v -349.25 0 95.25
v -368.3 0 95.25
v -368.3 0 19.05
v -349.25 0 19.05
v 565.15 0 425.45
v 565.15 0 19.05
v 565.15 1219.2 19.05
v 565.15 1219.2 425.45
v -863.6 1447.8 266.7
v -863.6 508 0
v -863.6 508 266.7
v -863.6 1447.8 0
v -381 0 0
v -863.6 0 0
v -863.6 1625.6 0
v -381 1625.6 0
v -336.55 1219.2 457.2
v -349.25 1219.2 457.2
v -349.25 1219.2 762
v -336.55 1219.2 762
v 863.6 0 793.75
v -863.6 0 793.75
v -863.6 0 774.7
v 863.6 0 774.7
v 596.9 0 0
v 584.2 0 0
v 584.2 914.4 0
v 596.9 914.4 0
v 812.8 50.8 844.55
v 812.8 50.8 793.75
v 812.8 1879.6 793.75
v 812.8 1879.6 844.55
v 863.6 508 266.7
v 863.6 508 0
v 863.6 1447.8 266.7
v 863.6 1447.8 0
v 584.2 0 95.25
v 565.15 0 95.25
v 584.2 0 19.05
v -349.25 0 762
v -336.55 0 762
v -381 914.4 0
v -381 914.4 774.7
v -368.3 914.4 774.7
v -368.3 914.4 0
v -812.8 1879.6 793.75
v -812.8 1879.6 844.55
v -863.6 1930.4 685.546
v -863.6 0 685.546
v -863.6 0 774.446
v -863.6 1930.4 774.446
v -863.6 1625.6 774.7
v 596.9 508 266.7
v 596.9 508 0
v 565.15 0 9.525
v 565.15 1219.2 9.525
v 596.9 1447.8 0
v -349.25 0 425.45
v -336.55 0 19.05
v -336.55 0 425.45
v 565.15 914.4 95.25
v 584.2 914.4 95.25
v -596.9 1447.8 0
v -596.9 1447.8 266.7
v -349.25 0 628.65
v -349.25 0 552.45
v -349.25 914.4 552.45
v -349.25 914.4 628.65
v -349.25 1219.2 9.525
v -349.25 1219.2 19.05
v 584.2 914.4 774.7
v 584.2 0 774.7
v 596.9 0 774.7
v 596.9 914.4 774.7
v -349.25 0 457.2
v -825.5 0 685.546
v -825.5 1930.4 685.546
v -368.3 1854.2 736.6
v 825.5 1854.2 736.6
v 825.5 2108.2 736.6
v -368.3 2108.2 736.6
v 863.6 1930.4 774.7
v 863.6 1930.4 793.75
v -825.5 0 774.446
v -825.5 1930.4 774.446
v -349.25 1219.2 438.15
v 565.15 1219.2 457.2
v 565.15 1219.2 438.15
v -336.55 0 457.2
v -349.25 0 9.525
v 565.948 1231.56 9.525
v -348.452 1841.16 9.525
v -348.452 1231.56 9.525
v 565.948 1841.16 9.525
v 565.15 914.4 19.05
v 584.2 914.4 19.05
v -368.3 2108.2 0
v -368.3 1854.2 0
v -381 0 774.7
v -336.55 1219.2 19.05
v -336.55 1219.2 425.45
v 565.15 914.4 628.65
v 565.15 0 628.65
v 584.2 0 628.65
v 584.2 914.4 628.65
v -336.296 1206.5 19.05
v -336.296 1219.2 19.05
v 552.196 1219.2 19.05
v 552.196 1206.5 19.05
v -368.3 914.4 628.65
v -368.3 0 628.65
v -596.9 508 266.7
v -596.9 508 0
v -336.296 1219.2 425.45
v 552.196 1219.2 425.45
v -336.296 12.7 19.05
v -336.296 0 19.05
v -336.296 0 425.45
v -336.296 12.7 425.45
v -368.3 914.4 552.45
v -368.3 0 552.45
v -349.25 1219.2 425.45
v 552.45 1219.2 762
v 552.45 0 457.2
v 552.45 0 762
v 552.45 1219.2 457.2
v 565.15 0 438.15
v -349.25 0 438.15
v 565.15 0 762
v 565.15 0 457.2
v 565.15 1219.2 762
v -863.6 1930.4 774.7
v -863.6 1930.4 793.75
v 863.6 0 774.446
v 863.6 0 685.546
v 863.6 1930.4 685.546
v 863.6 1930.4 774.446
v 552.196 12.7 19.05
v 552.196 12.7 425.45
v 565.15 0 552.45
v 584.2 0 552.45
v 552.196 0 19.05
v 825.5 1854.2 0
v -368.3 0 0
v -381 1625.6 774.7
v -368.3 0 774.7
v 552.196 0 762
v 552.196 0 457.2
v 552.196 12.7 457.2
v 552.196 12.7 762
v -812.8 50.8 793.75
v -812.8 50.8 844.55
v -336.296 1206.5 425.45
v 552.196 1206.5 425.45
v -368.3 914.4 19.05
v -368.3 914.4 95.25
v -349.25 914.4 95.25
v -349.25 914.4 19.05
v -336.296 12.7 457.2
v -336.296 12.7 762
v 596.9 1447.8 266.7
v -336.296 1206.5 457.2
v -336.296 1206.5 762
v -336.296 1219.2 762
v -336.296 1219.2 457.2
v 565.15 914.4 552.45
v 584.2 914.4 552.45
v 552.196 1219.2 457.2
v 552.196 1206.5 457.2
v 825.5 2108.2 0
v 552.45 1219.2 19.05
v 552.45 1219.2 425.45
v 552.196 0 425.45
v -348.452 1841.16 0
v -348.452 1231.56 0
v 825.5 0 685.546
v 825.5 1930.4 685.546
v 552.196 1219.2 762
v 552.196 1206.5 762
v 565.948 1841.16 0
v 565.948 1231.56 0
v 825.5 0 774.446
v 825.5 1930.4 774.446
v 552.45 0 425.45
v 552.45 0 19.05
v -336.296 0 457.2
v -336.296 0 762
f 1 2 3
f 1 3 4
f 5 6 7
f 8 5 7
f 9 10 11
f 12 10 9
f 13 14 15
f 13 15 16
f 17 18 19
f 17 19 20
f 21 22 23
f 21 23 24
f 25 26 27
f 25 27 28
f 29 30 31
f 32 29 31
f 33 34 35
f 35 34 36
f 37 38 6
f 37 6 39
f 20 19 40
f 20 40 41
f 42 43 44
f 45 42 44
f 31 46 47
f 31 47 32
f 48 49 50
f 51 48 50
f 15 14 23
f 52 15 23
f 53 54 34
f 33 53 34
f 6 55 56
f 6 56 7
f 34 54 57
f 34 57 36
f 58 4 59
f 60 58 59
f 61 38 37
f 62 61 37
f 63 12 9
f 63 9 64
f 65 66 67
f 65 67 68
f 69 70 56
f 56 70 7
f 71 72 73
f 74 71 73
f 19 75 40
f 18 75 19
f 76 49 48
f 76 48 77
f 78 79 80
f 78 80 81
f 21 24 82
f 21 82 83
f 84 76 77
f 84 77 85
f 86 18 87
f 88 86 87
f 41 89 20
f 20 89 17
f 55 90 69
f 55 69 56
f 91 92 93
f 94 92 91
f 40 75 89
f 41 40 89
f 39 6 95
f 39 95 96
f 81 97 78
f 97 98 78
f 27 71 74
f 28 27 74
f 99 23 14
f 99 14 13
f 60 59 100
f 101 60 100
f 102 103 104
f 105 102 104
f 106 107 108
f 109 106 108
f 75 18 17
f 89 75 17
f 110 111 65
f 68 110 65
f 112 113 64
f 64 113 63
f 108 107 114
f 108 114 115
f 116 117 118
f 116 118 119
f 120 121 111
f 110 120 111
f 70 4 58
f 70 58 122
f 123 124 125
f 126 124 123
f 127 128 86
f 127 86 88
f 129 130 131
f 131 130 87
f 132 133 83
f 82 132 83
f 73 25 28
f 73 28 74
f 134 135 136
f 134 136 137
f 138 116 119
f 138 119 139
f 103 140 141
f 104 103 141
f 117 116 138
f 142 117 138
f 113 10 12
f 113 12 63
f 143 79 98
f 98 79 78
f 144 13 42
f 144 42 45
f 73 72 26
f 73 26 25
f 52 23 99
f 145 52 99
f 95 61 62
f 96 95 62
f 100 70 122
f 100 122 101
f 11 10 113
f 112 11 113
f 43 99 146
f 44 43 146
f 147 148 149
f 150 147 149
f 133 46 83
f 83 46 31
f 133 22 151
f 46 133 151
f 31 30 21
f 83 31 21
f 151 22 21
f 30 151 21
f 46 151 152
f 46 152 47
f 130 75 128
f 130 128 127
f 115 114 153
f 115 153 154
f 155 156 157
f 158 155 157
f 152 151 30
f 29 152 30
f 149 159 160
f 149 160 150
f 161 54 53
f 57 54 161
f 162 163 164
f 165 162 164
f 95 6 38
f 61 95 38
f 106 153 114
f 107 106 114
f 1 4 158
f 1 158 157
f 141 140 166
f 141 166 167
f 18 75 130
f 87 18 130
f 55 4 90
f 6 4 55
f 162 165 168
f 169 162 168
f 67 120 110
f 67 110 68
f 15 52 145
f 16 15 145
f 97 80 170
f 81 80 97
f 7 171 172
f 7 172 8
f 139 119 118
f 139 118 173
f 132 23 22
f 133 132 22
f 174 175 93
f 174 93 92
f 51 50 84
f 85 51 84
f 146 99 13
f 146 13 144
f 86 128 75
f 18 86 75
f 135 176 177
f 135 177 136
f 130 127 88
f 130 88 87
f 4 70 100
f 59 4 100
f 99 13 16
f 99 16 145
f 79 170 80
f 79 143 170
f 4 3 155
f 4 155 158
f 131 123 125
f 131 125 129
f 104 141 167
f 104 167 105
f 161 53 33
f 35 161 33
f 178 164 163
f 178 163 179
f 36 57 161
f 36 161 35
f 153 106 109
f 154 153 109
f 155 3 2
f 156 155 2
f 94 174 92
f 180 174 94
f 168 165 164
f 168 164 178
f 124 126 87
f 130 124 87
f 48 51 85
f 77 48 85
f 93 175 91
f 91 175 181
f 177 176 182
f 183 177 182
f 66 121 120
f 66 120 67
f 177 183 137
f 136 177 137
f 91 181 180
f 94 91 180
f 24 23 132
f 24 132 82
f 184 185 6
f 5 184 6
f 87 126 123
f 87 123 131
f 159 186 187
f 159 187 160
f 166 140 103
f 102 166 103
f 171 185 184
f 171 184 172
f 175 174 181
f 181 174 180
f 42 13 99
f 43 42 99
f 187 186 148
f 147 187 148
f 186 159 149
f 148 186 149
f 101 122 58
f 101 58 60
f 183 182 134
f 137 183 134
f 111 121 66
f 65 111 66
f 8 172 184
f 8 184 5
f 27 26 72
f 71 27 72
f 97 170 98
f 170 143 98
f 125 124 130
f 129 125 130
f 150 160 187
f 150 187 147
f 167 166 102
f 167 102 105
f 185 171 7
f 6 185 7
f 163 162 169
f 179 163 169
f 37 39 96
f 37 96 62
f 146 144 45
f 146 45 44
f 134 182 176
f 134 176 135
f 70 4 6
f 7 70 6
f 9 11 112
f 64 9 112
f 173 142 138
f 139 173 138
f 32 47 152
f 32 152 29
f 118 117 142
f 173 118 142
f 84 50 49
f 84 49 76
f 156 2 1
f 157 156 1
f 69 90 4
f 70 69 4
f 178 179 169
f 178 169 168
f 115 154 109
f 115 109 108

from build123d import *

# Parameters (mm, degrees)
F0_W           = 1727.2
F0_H           = 19.05
F1_DEPTH       = 1930.4
F0_W_2         = 38.1
F0_H_2         = 88.9
F3_W           = 266.7
F3_H           = 939.8
F4_DEPTH       = 266.7
F5_W           = 12.7
F5_H           = 774.7
F6_DEPTH       = 914.4
F7_W           = 19.05
F7_H           = 76.2
F8_DEPTH       = 914.4
F9_W           = 914.4
F9_H           = 9.525
F10_DEPTH      = 1219.2
F11_W          = 12.7
F11_H          = 1219.2
F12_DEPTH      = 406.4
F11_W_2        = 888.492
F11_H_2        = 12.7
F13_W          = 1625.6
F13_H          = 1828.8
F14_DEPTH      = 50.8
F15_W          = 1193.8
F15_H          = 736.6
F16_DEPTH      = 76.2
F16_DEPTH_BACK = 177.8
F17_W          = 482.6
F17_H          = 774.7
F18_DEPTH      = 1625.6
F19_W          = 914.4
F19_H          = 609.6
F20_DEPTH      = 9.525
F21_W          = 914.4
F21_H          = 19.05
F22_DEPTH      = 1219.2
F23_W          = 12.7
F23_H          = 1219.2
F24_DEPTH      = 304.8
F23_W_2        = 888.492
F23_H_2        = 12.7


with BuildPart() as f1:
    # F0 (on Front) → F1 (new body)
    with BuildSketch(Plane.XZ):
        with Locations((0, 784.225)):
            Rectangle(F0_W, F0_H)
    extrude(amount=-F1_DEPTH)

    # F13 (on face) → F14 (join)
    with BuildSketch(Plane.XY.offset(793.75)):
        with Locations((0, 965.2)):
            Rectangle(F13_W, F13_H)
    extrude(amount=F14_DEPTH)


with BuildPart() as f1b:
    # F0 (on Front) → F1, piece 2 (new body)
    with BuildSketch(Plane.XZ):
        with Locations((844.55, 729.996)):
            Rectangle(F0_W_2, F0_H_2)
    extrude(amount=-F1_DEPTH)


with BuildPart() as f1c:
    # F0 (on Front) → F1, piece 3 (new body)
    with BuildSketch(Plane.XZ):
        with Locations((-844.55, 729.996)):
            Rectangle(F0_W_2, F0_H_2)
    extrude(amount=-F1_DEPTH)


with BuildPart() as f4:
    # F3 (on Top) → F4 (new body)
    with BuildSketch(Plane.XY):
        with Locations((730.25, 977.9)):
            Rectangle(F3_W, F3_H)
    extrude(amount=F4_DEPTH)


with BuildPart() as f4b:
    # F3 (on Top) → F4, piece 2 (new body)
    with BuildSketch(Plane.XY):
        with Locations((-730.25, 977.9)):
            Rectangle(F3_W, F3_H)
    extrude(amount=F4_DEPTH)


with BuildPart() as f6:
    # F5 (on Front) → F6 (new body)
    with BuildSketch(Plane.XZ):
        with Locations((-374.65, 387.35)):
            Rectangle(F5_W, F5_H)
    extrude(amount=-F6_DEPTH)


with BuildPart() as f6b:
    # F5 (on Front) → F6, piece 2 (new body)
    with BuildSketch(Plane.XZ):
        with Locations((590.55, 387.35)):
            Rectangle(F5_W, F5_H)
    extrude(amount=-F6_DEPTH)


with BuildPart() as f8:
    # F7 (on Front) → F8 (new body)
    with BuildSketch(Plane.XZ):
        with Locations((-358.775, 57.15)):
            Rectangle(F7_W, F7_H)
    extrude(amount=-F8_DEPTH)


with BuildPart() as f8b:
    # F7 (on Front) → F8, piece 2 (new body)
    with BuildSketch(Plane.XZ):
        with Locations((574.675, 57.15)):
            Rectangle(F7_W, F7_H)
    extrude(amount=-F8_DEPTH)


with BuildPart() as f8c:
    # F7 (on Front) → F8, piece 3 (new body)
    with BuildSketch(Plane.XZ):
        with Locations((-358.775, 590.55)):
            Rectangle(F7_W, F7_H)
    extrude(amount=-F8_DEPTH)


with BuildPart() as f8d:
    # F7 (on Front) → F8, piece 4 (new body)
    with BuildSketch(Plane.XZ):
        with Locations((574.675, 590.55)):
            Rectangle(F7_W, F7_H)
    extrude(amount=-F8_DEPTH)


with BuildPart() as f10:
    # F9 (on Front) → F10 (new body)
    with BuildSketch(Plane.XZ):
        with Locations((107.95, 14.2875)):
            Rectangle(F9_W, F9_H)
    extrude(amount=-F10_DEPTH)


with BuildPart() as f12:
    # F11 (on face) → F12 (new body)
    with BuildSketch(Plane.XY.offset(19.05)):
        with Locations((-342.9, 609.6)):
            Rectangle(F11_W, F11_H)
    extrude(amount=F12_DEPTH)


with BuildPart() as f12b:
    # F11 (on face) → F12, piece 2 (new body)
    with BuildSketch(Plane.XY.offset(19.05)):
        with Locations((558.8, 609.6)):
            Rectangle(F11_W, F11_H)
    extrude(amount=F12_DEPTH)


with BuildPart() as f12c:
    # F11 (on face) → F12, piece 3 (new body)
    with BuildSketch(Plane.XY.offset(19.05)):
        with Locations((107.95, 1212.85)):
            Rectangle(F11_W_2, F11_H_2)
    extrude(amount=F12_DEPTH)


with BuildPart() as f12d:
    # F11 (on face) → F12, piece 4 (new body)
    with BuildSketch(Plane.XY.offset(19.05)):
        with Locations((107.95, 6.35)):
            Rectangle(F11_W_2, F11_H_2)
    extrude(amount=F12_DEPTH)


with BuildPart() as f16:
    # F15 (on face) → F16 (new body, two sides)
    with BuildSketch(Plane(origin=(0, 1930.4, 0), x_dir=(-1, 0, 0), z_dir=(0, 1, 0))) as f16_sk:
        with Locations((-228.6, 368.3)):
            Rectangle(F15_W, F15_H)
    extrude(amount=-F16_DEPTH)
    extrude(f16_sk.sketch, amount=F16_DEPTH_BACK)


with BuildPart() as f18:
    # F17 (on face) → F18 (new body)
    with BuildSketch(Plane.XZ):
        with Locations((-622.3, 387.35)):
            Rectangle(F17_W, F17_H)
    extrude(amount=-F18_DEPTH)


with BuildPart() as f20:
    # F19 (on Top) → F20 (new body)
    with BuildSketch(Plane.XY):
        with Locations((108.7481622696, 1536.3599918365)):
            Rectangle(F19_W, F19_H)
    extrude(amount=F20_DEPTH)


with BuildPart() as f22:
    # F21 (on face) → F22 (new body, through all)
    with BuildSketch(Plane.XZ):
        with Locations((107.95, 447.675)):
            Rectangle(F21_W, F21_H)
    extrude(amount=-F22_DEPTH)


with BuildPart() as f24:
    # F23 (on face) → F24 (new body, through all)
    with BuildSketch(Plane.XY.offset(457.2)):
        with Locations((-342.9, 609.6)):
            Rectangle(F23_W, F23_H)
    extrude(amount=F24_DEPTH)


with BuildPart() as f24b:
    # F23 (on face) → F24, piece 2 (new body, through all)
    with BuildSketch(Plane.XY.offset(457.2)):
        with Locations((558.8, 609.6)):
            Rectangle(F23_W, F23_H)
    extrude(amount=F24_DEPTH)


with BuildPart() as f24c:
    # F23 (on face) → F24, piece 3 (new body, through all)
    with BuildSketch(Plane.XY.offset(457.2)):
        with Locations((107.95, 6.35)):
            Rectangle(F23_W_2, F23_H_2)
    extrude(amount=F24_DEPTH)


with BuildPart() as f24d:
    # F23 (on face) → F24, piece 4 (new body, through all)
    with BuildSketch(Plane.XY.offset(457.2)):
        with Locations((107.95, 1212.85)):
            Rectangle(F23_W_2, F23_H_2)
    extrude(amount=F24_DEPTH)


solid = Compound([f1.part, f1b.part, f1c.part, f4.part, f4b.part, f6.part, f6b.part, f8.part, f8b.part, f8c.part, f8d.part, f10.part, f12.part, f12b.part, f12c.part, f12d.part, f16.part, f18.part, f20.part, f22.part, f24.part, f24b.part, f24c.part, f24d.part])
